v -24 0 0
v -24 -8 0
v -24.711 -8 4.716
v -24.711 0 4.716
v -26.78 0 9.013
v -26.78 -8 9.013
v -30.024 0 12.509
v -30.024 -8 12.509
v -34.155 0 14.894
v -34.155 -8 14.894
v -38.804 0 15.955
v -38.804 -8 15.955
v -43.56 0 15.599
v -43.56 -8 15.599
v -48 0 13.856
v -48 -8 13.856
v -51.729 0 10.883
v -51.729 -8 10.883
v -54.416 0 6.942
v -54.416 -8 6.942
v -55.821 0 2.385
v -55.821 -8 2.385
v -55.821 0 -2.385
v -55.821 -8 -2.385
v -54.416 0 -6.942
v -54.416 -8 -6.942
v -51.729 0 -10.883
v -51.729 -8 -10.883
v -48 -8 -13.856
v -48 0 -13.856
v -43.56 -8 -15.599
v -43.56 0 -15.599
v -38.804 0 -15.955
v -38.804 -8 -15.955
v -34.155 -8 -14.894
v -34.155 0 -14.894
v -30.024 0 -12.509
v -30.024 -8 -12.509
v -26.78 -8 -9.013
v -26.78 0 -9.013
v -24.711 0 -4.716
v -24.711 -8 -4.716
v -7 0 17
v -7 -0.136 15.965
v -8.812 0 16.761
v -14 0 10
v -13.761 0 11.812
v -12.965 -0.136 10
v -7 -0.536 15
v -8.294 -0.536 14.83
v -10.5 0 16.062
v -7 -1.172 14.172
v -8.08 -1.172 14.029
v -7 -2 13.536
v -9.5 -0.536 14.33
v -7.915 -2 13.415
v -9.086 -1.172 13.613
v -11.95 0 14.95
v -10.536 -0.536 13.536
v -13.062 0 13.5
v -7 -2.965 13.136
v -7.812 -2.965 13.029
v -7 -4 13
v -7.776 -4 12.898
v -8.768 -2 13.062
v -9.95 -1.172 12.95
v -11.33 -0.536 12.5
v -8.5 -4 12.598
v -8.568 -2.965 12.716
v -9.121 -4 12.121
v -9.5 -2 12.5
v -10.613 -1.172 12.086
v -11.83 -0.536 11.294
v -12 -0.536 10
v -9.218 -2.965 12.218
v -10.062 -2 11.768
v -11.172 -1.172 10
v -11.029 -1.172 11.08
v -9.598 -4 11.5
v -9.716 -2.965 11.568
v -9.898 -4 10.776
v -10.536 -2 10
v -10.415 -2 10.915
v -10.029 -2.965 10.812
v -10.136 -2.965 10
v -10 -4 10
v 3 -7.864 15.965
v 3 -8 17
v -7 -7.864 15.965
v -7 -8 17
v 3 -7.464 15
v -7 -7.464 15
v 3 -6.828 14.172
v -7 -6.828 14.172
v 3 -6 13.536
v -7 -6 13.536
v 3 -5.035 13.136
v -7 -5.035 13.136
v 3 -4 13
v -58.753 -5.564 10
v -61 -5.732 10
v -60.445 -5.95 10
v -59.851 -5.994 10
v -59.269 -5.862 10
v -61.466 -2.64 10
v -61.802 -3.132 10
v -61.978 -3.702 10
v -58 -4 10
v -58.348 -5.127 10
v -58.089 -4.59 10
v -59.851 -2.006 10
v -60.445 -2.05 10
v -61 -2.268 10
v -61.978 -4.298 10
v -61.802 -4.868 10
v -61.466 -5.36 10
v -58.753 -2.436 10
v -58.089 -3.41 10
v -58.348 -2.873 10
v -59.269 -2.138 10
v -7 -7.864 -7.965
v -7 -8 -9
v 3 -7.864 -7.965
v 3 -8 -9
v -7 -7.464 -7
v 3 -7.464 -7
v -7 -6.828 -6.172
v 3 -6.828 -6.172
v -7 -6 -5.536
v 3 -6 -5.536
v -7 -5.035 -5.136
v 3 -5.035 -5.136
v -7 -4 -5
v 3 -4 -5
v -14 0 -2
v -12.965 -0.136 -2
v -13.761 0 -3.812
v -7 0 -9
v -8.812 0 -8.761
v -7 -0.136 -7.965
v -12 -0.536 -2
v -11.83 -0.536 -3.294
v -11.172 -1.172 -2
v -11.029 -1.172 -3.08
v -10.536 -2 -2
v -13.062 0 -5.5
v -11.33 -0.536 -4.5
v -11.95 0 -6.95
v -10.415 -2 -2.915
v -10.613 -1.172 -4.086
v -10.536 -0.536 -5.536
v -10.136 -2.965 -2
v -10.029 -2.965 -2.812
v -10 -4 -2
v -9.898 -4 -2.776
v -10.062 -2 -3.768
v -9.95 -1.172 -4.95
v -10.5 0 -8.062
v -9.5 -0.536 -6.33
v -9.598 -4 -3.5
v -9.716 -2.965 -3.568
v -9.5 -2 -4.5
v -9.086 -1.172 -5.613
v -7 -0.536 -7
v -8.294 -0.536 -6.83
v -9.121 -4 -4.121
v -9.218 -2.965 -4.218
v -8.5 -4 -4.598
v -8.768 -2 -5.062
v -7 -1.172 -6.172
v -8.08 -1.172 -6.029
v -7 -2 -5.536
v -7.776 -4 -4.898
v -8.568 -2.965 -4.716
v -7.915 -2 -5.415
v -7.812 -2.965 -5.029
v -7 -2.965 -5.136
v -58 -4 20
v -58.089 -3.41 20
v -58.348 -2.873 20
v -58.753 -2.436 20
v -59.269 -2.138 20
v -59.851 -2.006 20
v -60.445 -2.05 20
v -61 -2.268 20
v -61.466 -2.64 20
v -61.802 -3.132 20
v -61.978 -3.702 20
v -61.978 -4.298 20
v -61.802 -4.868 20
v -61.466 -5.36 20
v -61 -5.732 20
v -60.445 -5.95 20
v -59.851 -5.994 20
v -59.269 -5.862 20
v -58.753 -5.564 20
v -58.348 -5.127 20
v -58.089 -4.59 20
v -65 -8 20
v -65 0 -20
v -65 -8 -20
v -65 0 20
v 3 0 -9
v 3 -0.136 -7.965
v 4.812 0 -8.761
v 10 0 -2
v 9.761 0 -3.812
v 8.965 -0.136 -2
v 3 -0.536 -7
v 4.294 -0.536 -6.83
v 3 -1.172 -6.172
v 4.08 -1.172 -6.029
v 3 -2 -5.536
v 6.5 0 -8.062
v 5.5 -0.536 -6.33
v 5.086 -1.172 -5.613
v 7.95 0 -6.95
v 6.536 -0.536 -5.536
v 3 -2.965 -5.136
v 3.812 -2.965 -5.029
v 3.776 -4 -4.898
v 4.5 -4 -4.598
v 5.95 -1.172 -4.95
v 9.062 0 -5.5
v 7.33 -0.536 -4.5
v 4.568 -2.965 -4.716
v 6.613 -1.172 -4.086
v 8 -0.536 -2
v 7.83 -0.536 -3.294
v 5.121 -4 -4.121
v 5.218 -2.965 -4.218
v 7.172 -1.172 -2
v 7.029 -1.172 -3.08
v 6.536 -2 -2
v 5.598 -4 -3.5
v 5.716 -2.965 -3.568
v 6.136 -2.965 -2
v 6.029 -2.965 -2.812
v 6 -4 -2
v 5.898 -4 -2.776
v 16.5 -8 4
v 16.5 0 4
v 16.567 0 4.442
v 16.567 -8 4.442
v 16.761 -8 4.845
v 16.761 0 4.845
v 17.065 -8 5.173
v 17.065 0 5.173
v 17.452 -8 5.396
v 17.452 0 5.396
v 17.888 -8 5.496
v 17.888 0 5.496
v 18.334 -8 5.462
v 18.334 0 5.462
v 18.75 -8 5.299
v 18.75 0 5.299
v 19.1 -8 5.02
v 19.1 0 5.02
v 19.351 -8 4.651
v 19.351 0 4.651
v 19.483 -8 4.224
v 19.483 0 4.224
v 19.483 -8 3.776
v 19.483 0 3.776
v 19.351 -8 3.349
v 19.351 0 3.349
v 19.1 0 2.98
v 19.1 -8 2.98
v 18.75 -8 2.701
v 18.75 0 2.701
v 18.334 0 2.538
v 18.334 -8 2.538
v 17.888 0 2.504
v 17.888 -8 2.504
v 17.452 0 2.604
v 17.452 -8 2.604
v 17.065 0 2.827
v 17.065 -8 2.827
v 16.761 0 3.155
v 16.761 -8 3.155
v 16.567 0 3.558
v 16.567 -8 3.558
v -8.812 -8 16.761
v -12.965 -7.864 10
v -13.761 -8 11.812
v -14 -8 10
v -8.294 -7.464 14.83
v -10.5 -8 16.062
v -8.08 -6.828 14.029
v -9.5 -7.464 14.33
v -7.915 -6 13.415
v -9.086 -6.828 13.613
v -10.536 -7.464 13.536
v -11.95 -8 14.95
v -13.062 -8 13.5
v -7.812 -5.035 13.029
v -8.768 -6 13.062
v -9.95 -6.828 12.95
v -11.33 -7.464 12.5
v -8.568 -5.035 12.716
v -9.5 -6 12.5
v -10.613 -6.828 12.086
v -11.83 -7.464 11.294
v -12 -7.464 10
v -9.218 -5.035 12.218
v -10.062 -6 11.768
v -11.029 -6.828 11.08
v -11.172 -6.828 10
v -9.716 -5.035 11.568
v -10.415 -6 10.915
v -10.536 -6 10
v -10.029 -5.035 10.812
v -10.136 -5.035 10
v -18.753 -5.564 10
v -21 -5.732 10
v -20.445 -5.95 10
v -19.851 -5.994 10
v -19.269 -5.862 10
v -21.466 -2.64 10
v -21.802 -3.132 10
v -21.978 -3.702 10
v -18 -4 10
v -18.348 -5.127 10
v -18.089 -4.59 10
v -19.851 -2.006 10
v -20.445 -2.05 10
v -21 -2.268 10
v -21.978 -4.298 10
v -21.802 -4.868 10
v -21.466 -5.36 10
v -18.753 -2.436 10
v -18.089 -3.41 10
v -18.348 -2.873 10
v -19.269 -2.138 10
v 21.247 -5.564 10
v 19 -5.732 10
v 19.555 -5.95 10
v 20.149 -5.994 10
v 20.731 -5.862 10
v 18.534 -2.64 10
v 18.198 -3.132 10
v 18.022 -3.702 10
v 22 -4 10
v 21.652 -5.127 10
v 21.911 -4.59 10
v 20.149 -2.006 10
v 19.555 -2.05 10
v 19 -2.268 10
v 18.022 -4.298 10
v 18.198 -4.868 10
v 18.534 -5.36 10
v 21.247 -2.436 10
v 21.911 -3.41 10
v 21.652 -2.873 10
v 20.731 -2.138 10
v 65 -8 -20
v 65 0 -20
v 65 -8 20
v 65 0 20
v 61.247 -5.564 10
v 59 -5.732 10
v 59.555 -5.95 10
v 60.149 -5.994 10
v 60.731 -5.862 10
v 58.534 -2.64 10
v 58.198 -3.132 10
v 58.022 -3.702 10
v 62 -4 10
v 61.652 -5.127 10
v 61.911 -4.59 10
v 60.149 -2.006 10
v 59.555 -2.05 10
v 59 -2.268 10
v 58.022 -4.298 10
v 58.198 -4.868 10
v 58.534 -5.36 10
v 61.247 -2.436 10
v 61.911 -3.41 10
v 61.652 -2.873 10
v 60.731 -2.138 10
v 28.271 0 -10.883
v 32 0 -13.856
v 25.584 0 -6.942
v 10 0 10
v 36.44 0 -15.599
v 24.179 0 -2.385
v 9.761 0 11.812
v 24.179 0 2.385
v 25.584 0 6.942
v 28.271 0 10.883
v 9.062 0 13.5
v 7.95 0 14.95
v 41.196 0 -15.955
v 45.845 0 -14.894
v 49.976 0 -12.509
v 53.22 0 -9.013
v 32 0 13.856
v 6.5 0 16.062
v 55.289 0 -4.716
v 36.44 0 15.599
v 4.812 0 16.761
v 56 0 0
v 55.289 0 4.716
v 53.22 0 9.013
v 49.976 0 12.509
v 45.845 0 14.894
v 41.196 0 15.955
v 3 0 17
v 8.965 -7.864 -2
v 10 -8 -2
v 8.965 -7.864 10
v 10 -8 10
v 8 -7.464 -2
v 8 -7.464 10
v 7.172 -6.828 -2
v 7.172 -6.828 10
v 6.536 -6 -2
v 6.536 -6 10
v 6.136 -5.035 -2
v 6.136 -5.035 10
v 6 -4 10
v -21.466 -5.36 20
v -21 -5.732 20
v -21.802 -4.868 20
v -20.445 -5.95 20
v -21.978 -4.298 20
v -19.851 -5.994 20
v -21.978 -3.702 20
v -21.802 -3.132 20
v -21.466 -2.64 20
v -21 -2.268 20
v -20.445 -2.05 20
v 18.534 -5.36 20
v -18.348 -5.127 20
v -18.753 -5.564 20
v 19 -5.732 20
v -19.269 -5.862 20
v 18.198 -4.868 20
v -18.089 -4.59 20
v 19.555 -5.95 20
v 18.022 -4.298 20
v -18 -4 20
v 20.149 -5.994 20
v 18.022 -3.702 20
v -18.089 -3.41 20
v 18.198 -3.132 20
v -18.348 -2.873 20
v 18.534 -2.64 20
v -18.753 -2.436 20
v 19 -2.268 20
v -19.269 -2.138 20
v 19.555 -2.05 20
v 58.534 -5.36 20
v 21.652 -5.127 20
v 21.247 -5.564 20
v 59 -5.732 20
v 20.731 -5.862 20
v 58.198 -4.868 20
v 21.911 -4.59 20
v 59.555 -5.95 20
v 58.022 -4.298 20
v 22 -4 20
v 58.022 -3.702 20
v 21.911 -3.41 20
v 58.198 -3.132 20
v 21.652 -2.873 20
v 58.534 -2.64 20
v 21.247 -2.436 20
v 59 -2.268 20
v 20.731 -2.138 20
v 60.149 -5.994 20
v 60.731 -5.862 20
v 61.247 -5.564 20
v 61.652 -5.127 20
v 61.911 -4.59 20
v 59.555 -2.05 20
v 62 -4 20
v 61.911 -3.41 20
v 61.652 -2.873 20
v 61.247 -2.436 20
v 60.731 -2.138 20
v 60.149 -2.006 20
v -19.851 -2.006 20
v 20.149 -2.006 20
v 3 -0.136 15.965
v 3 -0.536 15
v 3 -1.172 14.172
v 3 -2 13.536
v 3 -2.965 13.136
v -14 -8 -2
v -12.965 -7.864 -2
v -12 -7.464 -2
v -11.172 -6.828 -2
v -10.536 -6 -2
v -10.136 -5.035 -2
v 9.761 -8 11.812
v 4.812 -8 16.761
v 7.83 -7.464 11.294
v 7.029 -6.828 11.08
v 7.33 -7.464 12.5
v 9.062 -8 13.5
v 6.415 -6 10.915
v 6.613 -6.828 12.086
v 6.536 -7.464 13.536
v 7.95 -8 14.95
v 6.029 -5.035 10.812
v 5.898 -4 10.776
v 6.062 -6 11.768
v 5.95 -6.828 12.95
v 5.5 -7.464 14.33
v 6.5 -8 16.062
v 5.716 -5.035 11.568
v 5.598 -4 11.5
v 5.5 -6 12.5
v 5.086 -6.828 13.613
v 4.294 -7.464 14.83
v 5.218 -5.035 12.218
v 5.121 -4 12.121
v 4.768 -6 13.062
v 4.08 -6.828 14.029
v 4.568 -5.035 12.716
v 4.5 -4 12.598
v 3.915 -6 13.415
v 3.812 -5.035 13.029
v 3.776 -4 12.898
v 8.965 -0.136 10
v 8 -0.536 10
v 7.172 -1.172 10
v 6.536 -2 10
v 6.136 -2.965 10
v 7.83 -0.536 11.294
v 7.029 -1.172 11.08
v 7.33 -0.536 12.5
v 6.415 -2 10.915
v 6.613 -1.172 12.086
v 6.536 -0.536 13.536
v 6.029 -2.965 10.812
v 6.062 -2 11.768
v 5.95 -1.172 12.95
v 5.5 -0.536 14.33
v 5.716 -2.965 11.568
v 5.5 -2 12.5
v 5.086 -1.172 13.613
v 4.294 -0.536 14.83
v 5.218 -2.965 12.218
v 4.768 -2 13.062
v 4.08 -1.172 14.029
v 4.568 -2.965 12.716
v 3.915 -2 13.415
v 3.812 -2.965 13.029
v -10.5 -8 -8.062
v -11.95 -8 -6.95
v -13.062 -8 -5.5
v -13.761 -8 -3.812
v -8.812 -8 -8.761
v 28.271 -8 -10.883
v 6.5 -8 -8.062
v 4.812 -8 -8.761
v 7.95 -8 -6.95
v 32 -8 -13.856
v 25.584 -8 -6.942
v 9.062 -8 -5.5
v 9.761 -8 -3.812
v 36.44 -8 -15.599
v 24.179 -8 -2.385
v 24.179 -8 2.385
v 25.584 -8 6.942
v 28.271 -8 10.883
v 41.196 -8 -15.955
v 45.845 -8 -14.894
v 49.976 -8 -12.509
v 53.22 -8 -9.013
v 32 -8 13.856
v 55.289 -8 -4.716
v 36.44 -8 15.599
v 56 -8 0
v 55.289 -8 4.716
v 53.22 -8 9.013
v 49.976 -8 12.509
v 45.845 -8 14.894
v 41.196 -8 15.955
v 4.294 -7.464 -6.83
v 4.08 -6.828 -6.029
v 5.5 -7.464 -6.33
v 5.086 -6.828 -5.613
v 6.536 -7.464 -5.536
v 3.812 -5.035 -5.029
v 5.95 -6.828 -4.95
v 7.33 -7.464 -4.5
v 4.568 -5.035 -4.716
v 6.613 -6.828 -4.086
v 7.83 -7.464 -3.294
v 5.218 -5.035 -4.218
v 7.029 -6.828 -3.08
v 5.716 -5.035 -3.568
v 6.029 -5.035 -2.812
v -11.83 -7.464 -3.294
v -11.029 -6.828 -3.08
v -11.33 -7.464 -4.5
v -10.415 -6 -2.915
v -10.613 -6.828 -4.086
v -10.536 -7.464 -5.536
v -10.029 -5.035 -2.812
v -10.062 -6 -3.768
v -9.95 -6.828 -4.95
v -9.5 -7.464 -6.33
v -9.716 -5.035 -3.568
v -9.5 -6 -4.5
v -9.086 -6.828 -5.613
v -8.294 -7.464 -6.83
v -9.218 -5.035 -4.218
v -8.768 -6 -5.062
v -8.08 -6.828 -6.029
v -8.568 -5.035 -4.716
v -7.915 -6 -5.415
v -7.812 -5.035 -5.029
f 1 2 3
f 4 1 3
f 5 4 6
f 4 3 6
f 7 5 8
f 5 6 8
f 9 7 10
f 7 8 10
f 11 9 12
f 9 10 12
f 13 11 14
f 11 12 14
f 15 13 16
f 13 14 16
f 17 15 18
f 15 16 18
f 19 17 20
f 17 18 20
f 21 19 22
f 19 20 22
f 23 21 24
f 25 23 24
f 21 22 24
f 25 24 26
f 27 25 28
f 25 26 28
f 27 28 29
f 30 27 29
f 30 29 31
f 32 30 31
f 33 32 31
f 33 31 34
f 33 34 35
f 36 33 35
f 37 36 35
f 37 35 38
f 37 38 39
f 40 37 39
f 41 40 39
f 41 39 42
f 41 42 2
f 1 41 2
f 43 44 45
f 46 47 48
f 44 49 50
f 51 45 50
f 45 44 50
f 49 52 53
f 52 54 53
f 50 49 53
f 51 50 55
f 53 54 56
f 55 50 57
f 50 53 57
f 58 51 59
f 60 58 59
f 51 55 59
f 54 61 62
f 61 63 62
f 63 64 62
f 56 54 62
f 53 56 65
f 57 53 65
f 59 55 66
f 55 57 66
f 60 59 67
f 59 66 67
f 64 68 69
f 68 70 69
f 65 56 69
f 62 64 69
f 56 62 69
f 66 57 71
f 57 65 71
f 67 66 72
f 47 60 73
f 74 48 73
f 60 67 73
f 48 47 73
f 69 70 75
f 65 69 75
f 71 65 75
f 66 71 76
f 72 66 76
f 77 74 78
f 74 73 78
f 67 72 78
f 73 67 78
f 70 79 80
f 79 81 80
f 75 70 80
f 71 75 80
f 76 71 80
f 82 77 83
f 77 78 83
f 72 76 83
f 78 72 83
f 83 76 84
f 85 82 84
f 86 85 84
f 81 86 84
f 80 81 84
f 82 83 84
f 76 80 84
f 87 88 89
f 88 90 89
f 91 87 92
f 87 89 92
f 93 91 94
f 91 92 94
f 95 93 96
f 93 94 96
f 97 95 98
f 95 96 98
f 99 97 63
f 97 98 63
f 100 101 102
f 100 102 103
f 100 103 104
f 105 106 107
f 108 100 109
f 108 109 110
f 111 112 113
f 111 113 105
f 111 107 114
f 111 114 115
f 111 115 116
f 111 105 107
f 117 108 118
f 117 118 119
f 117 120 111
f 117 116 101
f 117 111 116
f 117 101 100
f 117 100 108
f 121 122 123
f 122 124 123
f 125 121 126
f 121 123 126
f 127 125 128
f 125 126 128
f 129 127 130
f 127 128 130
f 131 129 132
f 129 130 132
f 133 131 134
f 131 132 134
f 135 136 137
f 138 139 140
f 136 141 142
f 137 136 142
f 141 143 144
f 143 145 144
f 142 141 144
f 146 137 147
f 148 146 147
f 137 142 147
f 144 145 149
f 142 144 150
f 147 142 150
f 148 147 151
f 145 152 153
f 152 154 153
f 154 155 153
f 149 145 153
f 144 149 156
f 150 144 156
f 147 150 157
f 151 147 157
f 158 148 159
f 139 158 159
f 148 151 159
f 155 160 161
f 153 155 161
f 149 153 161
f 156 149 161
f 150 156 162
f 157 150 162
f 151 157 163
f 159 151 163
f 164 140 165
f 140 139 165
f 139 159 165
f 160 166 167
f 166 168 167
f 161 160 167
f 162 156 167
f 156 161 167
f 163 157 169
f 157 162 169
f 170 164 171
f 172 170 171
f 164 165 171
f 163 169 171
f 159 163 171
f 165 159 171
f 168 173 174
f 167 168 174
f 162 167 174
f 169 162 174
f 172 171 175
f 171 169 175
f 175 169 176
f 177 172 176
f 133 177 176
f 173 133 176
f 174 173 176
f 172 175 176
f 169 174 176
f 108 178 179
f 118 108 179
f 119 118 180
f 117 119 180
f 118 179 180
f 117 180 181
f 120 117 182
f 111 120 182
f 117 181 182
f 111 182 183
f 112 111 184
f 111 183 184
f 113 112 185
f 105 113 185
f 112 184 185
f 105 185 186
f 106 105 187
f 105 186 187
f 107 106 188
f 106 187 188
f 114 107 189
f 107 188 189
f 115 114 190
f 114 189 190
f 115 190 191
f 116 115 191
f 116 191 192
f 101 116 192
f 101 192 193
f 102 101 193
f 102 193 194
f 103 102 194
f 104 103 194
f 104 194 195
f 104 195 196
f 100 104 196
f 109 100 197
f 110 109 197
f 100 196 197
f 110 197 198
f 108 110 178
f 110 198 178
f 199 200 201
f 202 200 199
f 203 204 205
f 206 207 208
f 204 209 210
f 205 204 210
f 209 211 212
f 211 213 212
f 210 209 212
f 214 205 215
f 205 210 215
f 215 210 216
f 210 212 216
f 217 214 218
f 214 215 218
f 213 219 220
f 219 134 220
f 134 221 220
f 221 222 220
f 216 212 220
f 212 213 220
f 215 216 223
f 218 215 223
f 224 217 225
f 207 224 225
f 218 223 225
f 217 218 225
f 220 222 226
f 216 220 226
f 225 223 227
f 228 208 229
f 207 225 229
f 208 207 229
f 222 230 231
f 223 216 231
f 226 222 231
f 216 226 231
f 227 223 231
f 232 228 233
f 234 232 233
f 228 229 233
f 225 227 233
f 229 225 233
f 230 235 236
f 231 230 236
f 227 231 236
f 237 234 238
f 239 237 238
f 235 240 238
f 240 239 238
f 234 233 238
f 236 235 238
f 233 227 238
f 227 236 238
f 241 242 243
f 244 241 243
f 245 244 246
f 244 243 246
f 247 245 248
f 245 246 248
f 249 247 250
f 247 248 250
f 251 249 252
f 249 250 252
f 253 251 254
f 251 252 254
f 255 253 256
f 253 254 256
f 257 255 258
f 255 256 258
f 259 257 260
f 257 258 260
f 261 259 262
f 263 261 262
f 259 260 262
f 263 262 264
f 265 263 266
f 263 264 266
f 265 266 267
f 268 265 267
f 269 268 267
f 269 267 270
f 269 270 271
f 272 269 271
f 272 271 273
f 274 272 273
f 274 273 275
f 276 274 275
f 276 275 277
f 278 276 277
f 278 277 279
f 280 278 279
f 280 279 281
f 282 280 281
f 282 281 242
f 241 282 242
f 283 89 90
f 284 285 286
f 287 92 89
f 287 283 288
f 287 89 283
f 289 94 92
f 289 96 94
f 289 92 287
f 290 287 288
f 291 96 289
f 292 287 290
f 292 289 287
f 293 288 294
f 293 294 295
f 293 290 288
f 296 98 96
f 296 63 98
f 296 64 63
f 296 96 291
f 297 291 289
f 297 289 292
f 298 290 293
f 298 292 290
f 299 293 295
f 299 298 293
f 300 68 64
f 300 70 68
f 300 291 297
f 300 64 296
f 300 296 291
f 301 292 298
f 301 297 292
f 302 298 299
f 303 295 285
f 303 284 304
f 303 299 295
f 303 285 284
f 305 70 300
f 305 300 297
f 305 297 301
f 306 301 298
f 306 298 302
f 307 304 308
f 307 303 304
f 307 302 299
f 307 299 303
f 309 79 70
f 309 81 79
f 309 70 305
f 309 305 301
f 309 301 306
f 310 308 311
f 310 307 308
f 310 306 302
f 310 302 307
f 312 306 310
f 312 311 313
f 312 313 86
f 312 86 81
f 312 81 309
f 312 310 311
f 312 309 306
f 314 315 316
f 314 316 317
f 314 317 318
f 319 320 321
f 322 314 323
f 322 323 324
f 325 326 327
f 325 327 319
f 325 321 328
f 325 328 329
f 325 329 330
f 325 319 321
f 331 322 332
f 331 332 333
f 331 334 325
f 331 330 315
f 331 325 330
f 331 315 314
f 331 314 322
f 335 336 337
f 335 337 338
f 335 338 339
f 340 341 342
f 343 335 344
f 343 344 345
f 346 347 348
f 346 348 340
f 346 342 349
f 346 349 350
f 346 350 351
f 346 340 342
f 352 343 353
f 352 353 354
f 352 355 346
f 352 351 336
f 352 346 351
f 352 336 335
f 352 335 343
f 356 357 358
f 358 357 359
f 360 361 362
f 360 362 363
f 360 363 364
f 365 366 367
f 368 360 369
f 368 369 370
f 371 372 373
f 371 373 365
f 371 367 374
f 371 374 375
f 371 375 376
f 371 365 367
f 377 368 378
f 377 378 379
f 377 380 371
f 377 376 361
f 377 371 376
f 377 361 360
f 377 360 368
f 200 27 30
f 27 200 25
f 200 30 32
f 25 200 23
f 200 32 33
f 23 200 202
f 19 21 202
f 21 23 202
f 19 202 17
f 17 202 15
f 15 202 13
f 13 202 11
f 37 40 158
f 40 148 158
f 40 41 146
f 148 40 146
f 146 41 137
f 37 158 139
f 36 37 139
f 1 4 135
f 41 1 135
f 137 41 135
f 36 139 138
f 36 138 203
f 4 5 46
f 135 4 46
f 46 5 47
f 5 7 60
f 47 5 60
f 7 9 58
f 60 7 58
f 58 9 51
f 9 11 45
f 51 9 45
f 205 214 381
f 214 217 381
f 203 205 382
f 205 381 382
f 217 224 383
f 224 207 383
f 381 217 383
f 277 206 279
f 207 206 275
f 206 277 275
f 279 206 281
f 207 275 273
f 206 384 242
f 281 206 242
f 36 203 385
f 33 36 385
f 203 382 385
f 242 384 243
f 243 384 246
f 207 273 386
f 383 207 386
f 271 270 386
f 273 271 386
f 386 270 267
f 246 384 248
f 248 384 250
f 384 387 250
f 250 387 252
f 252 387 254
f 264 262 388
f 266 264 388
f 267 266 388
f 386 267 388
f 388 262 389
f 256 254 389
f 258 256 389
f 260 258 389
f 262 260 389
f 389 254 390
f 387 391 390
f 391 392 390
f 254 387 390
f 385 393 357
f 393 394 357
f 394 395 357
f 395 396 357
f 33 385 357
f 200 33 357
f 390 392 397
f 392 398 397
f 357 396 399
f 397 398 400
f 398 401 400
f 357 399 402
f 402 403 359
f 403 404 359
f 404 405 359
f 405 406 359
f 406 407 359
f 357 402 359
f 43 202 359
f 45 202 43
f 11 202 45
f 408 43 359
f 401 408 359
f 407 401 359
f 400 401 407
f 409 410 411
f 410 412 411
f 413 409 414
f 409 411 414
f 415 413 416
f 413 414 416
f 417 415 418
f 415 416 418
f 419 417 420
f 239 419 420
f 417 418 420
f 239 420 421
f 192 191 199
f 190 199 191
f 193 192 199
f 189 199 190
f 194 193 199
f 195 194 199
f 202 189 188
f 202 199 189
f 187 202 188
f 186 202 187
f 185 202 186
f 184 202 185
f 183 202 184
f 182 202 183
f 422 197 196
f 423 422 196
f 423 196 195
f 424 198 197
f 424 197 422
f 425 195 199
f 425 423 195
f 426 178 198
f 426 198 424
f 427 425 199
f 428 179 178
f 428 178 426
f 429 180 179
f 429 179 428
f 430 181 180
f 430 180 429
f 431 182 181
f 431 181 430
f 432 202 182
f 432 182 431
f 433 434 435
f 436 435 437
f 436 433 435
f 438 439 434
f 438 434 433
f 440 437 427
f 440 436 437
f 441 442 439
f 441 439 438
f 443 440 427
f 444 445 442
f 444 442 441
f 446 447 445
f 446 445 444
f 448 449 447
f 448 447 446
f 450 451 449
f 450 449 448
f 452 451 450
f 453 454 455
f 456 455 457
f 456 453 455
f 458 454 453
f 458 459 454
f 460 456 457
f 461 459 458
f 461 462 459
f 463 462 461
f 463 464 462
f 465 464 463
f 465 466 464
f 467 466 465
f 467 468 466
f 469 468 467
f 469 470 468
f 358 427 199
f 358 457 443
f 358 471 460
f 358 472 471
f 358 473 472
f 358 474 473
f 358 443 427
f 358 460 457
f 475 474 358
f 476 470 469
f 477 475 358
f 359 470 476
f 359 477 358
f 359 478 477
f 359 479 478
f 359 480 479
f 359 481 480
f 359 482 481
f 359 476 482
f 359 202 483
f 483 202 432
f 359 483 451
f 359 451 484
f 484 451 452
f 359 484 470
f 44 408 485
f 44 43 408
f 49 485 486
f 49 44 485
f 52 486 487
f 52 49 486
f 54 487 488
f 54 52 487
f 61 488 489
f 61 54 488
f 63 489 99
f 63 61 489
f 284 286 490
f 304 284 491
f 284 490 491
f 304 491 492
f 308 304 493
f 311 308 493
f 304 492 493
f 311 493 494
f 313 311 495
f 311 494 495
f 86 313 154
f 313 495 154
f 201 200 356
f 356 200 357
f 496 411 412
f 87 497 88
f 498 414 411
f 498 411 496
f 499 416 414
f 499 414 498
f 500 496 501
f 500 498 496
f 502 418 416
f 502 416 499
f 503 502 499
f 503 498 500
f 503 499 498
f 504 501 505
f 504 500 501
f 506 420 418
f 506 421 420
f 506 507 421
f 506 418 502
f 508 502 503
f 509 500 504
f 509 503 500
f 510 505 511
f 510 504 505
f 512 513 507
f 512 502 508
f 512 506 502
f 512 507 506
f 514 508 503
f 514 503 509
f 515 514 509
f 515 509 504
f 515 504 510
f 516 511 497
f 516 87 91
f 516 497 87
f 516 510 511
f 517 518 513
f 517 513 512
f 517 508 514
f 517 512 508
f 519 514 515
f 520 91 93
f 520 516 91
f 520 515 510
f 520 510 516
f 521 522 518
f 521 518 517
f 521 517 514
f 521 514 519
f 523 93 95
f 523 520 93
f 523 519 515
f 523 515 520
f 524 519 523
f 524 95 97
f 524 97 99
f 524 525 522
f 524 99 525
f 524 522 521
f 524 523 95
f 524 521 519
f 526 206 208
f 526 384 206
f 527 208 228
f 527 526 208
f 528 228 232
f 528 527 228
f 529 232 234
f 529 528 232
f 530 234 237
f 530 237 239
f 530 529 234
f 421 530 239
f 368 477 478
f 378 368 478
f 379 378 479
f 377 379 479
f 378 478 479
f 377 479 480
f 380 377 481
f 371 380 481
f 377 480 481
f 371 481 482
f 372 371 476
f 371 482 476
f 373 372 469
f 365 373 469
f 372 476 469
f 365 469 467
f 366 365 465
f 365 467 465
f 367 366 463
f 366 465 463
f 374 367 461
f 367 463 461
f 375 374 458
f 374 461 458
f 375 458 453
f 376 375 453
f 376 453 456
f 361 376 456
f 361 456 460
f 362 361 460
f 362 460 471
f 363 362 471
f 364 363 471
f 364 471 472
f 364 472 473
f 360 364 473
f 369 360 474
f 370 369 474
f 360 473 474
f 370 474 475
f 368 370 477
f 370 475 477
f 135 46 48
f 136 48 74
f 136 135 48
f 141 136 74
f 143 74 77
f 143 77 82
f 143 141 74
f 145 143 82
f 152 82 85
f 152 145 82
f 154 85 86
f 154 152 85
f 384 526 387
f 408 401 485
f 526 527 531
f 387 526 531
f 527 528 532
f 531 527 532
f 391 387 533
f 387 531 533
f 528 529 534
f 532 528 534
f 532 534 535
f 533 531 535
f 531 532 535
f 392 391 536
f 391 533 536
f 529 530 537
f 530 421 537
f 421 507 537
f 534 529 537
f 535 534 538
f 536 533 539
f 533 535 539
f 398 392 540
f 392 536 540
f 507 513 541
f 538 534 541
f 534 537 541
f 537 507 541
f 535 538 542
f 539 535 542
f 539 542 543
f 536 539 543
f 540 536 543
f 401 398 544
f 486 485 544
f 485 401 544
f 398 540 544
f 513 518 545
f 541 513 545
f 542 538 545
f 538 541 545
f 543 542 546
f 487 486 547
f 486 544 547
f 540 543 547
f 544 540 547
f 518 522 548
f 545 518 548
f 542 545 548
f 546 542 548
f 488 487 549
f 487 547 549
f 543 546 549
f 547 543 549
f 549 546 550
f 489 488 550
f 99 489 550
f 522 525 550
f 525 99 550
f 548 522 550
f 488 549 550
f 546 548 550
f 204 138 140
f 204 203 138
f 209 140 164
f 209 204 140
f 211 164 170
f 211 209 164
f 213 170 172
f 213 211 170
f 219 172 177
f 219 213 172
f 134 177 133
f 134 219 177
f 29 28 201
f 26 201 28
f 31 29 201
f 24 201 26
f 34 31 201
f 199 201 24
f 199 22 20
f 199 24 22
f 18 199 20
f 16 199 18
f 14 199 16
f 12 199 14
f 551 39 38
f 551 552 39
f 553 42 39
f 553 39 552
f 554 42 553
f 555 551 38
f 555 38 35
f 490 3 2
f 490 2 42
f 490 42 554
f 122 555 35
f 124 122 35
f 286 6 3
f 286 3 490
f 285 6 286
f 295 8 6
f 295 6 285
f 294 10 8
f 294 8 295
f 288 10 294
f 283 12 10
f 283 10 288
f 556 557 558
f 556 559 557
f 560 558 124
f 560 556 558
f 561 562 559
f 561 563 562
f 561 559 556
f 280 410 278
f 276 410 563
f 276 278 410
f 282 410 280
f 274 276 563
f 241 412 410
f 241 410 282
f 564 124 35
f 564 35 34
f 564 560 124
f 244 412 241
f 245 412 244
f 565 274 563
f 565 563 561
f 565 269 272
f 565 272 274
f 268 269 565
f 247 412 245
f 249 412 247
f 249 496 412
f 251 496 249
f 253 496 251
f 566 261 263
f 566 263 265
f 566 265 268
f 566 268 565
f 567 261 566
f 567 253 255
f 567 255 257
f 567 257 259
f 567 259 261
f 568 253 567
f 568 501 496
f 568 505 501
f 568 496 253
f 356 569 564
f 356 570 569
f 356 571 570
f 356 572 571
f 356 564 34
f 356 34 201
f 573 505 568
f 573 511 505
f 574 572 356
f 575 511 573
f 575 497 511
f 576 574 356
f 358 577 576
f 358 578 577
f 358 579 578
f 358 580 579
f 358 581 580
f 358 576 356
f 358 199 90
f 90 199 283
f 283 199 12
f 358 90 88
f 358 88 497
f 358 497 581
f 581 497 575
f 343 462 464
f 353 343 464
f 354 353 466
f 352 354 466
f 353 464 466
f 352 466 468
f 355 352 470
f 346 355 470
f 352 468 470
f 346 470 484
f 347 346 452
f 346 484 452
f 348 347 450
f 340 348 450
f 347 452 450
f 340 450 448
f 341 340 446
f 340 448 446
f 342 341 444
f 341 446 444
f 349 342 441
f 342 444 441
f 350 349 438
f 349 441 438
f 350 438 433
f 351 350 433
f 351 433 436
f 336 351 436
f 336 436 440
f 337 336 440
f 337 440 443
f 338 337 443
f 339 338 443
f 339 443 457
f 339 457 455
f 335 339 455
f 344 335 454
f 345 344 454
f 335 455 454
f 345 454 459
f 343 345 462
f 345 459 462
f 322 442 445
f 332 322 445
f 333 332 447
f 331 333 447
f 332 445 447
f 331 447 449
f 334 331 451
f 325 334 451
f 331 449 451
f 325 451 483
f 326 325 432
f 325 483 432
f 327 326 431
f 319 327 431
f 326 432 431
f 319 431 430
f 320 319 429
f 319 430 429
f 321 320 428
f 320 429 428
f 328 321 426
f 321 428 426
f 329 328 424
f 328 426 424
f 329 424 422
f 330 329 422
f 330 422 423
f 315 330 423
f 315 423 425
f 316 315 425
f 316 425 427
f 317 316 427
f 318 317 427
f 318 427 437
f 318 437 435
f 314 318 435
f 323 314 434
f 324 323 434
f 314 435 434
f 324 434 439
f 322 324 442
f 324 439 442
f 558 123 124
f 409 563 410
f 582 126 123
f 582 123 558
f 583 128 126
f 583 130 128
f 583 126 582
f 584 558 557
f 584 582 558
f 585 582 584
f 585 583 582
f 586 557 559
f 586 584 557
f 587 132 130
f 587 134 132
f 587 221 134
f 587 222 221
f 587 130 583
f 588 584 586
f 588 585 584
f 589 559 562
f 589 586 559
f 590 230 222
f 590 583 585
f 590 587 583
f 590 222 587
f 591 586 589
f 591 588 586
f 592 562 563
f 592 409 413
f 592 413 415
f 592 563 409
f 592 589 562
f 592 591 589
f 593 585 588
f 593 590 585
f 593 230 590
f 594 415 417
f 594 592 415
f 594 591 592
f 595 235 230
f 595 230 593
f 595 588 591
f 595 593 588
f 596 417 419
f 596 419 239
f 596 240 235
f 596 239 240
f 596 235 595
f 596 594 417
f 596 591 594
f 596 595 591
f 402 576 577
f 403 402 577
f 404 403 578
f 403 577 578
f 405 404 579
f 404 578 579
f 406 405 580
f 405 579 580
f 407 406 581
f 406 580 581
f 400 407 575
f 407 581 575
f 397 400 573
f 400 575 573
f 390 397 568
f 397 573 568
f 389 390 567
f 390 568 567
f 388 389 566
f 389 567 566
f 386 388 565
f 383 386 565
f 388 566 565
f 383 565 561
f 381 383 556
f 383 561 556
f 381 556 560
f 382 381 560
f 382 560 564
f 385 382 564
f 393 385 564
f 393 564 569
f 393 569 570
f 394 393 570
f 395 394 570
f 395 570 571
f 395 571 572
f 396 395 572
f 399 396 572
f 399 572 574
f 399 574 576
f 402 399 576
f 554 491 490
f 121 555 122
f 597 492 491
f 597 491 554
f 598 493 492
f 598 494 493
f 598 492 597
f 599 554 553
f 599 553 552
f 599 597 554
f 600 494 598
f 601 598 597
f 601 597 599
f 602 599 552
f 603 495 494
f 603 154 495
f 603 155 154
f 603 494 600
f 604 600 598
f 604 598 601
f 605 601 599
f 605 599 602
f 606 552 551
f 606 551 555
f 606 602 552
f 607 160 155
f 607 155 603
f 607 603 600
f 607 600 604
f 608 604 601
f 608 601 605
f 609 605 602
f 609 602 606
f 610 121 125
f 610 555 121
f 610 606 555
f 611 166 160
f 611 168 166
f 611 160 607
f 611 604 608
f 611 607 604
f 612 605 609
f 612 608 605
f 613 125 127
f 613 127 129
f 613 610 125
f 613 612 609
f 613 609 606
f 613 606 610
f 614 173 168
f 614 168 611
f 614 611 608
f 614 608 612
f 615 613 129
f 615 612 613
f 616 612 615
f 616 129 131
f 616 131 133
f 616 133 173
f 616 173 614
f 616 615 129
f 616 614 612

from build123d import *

# Parameters (mm, degrees)
F0_W      = 130
F0_H      = 40
F1_DEPTH  = 8
F2_R      = 16
F3_DEPTH  = 8.001
F4_R      = 2
F5_DEPTH  = 10
F7_DEPTH  = 25
F8_R      = 3.99999
F9_R      = 1.5
F10_DEPTH = 25


# Not quite as in the source:
# - a fillet or chamfer is up to 0.001 mm smaller than in the source, because OpenCascade refuses the exact size


with BuildPart() as f1:
    # F0 (on Front) → F1 (new body)
    with BuildSketch(Plane.XZ):
        Rectangle(F0_W, F0_H)
    extrude(amount=F1_DEPTH)

    # F2 (on face) → F3 (cut, through all)
    with BuildSketch(Plane.XZ.offset(8)):
        with Locations((40, 0)):
            Circle(F2_R)
        with Locations((-40, 0)):
            Circle(F2_R)
    extrude(amount=-F3_DEPTH, mode=Mode.SUBTRACT)

    # F4 (on face) → F5 (cut)
    with BuildSketch(Plane.XY.offset(20)):
        with Locations((-60, -4)):
            Circle(F4_R)
        with Locations((60, -4)):
            Circle(F4_R)
        with Locations((-20, -4)):
            Circle(F4_R)
        with Locations((20, -4)):
            Circle(F4_R)
    extrude(amount=-F5_DEPTH, mode=Mode.SUBTRACT)

    # F6 (on face) → F7 (cut)
    with BuildSketch(Plane.XZ.offset(8)):
        with BuildLine():
            Line((3, 13), (-7, 13))
            ThreePointArc((-7, 13), (-9.1213203436, 12.1213203436), (-10, 10))
            Line((-10, 10), (-10, -2))
            ThreePointArc((-10, -2), (-9.1213203436, -4.1213203436), (-7, -5))
            Line((-7, -5), (3, -5))
            ThreePointArc((3, -5), (5.1213203436, -4.1213203436), (6, -2))
            Line((6, -2), (6, 10))
            ThreePointArc((6, 10), (5.1213203436, 12.1213203436), (3, 13))
        make_face()
    extrude(amount=-F7_DEPTH, mode=Mode.SUBTRACT)

    # F8 (radius 4 in the source; OpenCascade refuses exactly that, so slightly less here)
    f8_edges = [f1.edges().sort_by_distance(p)[0] for p in [
        (6, -8, 4),
        (6, 0, 4),
    ]]
    fillet(f8_edges, radius=F8_R)

    # F9 (on face) → F10 (cut)
    with BuildSketch(Plane(origin=(0, 0, 0), x_dir=(-1, 0, 0), z_dir=(0, 1, 0))):
        with Locations((-18, 4)):
            Circle(F9_R)
    extrude(amount=-F10_DEPTH, mode=Mode.SUBTRACT)


solid = f1.part
